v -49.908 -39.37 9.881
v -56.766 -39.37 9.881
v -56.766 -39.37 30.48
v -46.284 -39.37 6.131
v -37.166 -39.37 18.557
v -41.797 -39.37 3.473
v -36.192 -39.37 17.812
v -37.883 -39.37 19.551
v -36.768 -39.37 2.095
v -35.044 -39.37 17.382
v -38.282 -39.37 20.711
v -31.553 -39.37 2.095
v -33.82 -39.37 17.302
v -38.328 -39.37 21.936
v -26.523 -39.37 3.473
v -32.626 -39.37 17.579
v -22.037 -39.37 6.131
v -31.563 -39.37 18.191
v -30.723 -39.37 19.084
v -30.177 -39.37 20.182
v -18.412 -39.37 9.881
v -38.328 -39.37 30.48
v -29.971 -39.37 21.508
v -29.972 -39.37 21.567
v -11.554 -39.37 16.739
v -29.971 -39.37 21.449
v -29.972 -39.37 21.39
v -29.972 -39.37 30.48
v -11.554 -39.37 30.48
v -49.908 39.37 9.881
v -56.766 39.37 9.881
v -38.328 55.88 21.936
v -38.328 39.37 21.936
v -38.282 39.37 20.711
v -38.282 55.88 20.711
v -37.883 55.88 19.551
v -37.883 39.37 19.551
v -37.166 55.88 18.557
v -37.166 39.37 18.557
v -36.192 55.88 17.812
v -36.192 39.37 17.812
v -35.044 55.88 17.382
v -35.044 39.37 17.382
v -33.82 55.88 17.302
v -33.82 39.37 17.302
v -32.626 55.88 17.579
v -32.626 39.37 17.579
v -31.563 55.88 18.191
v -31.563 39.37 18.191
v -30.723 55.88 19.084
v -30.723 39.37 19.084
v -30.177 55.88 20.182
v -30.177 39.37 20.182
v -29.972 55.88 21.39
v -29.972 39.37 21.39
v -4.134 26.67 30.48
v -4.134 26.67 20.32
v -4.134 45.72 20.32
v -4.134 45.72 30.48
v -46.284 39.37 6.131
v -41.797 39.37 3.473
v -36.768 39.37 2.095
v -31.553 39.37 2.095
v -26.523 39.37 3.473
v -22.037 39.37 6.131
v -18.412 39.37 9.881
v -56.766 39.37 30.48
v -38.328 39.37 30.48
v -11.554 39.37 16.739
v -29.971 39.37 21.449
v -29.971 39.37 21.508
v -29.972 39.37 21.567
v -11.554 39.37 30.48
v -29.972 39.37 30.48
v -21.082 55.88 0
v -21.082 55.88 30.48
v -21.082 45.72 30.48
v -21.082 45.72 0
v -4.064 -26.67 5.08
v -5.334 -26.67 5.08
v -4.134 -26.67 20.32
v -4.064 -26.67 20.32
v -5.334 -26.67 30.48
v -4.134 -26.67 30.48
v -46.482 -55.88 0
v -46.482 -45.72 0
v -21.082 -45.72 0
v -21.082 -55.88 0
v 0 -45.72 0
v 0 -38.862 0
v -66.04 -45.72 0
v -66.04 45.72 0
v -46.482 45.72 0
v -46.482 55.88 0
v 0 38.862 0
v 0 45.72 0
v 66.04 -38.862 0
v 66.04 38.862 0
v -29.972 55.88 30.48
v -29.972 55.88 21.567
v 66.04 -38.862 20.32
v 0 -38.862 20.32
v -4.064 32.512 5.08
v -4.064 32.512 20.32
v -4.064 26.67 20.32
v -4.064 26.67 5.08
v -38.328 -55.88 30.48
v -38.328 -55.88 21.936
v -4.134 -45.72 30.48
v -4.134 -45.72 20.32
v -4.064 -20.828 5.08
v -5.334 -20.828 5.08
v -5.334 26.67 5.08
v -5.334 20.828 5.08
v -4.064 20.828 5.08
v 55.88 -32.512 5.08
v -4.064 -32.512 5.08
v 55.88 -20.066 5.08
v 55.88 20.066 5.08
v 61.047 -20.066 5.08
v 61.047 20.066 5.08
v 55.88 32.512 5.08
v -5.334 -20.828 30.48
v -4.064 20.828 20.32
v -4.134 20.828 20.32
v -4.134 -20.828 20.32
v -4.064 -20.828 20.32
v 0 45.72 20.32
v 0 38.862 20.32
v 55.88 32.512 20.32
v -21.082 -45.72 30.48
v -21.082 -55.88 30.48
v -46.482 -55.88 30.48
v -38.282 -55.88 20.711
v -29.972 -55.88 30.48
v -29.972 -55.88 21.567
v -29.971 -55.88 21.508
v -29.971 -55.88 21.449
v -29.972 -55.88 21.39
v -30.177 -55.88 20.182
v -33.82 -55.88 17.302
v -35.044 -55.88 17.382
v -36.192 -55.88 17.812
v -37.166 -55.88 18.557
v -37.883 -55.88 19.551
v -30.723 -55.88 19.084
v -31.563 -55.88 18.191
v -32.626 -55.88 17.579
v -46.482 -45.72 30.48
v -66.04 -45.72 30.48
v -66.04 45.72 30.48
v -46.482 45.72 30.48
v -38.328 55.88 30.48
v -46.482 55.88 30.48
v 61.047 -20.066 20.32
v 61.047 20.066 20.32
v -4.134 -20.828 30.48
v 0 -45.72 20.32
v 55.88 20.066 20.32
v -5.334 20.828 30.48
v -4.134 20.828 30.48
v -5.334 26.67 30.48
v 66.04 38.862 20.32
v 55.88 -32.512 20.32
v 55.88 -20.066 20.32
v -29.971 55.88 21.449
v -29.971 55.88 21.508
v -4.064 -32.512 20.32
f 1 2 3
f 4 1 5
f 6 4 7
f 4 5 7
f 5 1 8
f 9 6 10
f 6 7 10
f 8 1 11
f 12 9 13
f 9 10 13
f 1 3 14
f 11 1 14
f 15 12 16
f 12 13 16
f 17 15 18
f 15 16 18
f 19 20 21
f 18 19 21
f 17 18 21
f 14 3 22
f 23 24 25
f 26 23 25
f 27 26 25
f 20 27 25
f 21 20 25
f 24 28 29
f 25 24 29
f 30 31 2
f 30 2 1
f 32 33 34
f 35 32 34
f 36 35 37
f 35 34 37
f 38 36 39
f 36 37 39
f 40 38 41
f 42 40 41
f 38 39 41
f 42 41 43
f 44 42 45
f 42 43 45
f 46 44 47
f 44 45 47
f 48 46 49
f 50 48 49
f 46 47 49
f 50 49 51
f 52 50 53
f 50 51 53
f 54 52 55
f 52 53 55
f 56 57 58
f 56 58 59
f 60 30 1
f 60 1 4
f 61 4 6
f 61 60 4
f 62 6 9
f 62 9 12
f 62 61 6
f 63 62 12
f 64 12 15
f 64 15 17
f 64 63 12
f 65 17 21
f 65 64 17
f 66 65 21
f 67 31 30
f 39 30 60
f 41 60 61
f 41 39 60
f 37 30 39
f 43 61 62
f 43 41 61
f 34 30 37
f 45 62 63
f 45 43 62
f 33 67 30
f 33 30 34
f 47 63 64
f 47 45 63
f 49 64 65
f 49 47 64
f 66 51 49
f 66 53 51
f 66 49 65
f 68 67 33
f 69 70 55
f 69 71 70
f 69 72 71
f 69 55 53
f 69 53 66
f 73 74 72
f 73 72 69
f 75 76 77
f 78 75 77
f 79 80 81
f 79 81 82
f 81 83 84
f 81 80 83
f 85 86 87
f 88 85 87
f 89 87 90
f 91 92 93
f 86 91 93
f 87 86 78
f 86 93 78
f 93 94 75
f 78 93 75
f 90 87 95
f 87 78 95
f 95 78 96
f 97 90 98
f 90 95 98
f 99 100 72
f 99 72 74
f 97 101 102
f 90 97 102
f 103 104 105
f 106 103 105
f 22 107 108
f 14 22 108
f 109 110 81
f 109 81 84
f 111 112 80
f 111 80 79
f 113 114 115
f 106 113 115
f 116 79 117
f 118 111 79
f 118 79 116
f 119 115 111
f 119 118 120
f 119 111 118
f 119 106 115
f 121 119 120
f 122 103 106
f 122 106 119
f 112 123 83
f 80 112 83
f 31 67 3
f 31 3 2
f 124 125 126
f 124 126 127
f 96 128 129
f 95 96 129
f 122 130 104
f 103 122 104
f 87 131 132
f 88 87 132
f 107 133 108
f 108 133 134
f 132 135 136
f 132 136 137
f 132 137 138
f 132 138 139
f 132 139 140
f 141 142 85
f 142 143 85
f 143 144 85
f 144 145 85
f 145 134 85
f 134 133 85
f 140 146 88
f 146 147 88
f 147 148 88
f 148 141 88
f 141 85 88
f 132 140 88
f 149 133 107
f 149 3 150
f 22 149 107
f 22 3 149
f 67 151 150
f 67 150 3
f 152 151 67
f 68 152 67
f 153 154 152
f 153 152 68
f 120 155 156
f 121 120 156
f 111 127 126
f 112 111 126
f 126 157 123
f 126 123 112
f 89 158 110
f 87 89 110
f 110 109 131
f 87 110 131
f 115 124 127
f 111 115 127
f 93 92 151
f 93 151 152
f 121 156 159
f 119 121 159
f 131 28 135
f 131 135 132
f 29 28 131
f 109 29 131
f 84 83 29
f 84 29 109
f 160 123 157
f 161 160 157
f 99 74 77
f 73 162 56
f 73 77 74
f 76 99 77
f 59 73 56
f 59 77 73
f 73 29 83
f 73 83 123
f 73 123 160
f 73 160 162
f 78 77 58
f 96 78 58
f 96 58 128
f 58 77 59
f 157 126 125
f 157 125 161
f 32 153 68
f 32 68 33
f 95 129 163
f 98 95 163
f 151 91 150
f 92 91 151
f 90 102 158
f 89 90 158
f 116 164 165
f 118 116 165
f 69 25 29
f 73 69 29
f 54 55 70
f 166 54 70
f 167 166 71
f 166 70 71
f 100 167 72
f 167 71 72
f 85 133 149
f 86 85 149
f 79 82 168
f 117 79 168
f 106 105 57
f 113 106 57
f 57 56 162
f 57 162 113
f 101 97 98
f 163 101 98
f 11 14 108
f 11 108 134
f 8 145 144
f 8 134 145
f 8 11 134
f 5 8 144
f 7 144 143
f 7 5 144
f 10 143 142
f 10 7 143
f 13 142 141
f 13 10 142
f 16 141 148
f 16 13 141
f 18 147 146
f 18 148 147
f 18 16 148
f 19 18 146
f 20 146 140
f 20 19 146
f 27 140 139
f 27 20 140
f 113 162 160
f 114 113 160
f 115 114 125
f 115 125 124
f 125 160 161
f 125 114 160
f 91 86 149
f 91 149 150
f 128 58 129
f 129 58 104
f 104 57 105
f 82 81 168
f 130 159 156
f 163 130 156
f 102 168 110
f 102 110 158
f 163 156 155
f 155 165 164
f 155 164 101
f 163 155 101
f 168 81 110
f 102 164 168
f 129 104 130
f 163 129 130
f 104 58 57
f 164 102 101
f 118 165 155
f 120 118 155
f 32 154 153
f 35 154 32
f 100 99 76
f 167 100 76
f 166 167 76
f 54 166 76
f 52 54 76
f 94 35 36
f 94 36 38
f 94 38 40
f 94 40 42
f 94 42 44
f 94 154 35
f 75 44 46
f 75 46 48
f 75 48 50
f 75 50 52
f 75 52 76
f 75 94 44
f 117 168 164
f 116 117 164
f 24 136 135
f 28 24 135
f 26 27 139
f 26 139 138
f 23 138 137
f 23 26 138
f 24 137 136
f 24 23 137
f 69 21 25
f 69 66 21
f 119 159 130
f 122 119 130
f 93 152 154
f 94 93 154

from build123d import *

# Parameters (mm, degrees)
F0_W          = 132.08
F0_H          = 111.76
F1_DEPTH      = 30.48
F3_DEPTH      = 25.4
F5_DEPTH      = 39.37
F5_DEPTH_BACK = 39.37
F7_DEPTH      = 127
F7_DEPTH_BACK = 127
F8_W          = 70.1737586008
F8_H          = 10.16
F9_DEPTH      = 124.52238
F10_W         = 219.0220057964
F10_H         = 191.3975924253
F11_DEPTH     = 40.60273


with BuildPart() as f1:
    # F0 (on Top) → F1 (new body)
    with BuildSketch(Plane.XY):
        Rectangle(F0_W, F0_H)
    extrude(amount=F1_DEPTH)

    # F2 (on face) → F3 (cut)
    with BuildSketch(Plane.XY.offset(30.48)):
        Polygon((55.88, 32.512), (-4.064, 32.512), (-4.064, 26.67), (-5.334, 26.67), (-5.334, 20.828), (-4.064, 20.828), (-4.064, -20.828), (-5.334, -20.828), (-5.334, -26.67), (-4.064, -26.67), (-4.064, -32.512), (55.88, -32.512), (55.88, -20.066), (61.0470063984, -20.066), (61.0470063984, 20.066), (55.88, 20.066), align=None)
    extrude(amount=-F3_DEPTH, mode=Mode.SUBTRACT)

    # F4 (on Front) → F5 (cut, two sides)
    with BuildSketch(Plane.XZ) as f5_sk:
        with BuildLine():
            Line((-56.7663048146, 9.8806022625), (-49.9083048146, 9.8806022625))
            ThreePointArc((-49.9083048146, 9.8806022625), (-34.1603048146, 1.9206995202), (-18.4123048146, 9.8806022625))
            Line((-18.4123048146, 9.8806022625), (-11.5543048146, 16.7386022625))
            Line((-11.5543048146, 16.7386022625), (-11.5543048146, 37.6269482076))
            Line((-11.5543048146, 37.6269482076), (-56.7663048146, 37.6269482076))
            Line((-56.7663048146, 37.6269482076), (-56.7663048146, 9.8806022625))
        make_face()
    extrude(amount=F5_DEPTH, mode=Mode.SUBTRACT)
    extrude(f5_sk.sketch, amount=-F5_DEPTH_BACK, mode=Mode.SUBTRACT)

    # F6 (on Front) → F7 (cut, two sides)
    with BuildSketch(Plane.XZ) as f7_sk:
        with BuildLine():
            Line((-38.3278677172, 31.1981041294), (-38.3278677172, 21.9360575249))
            ThreePointArc((-38.3278677172, 21.9360575249), (-34.4349396554, 17.2967755581), (-29.9718115766, 21.3904675121))
            Line((-29.9718115766, 21.3904675121), (-29.9718115766, 21.5672736871))
            Line((-29.9718115766, 21.5672736871), (-29.9718115766, 31.1981041294))
            Line((-29.9718115766, 31.1981041294), (-38.3278677172, 31.1981041294))
        make_face()
        with BuildLine():
            Line((-29.9718115766, 21.5672736871), (-29.9718115766, 21.3904675121))
            ThreePointArc((-29.9718115766, 21.3904675121), (-29.9708791052, 21.4788705996), (-29.9718115766, 21.5672736871))
        make_face()
    extrude(amount=-F7_DEPTH, mode=Mode.SUBTRACT)
    extrude(f7_sk.sketch, amount=F7_DEPTH_BACK, mode=Mode.SUBTRACT)

    # F8 (on face) → F9 (cut)
    with BuildSketch(Plane.XZ.offset(55.88)):
        with Locations((30.9531206996, 25.4)):
            Rectangle(F8_W, F8_H)
    extrude(amount=-F9_DEPTH, mode=Mode.SUBTRACT)

    # F10 (on face) → F11 (cut)
    with BuildSketch(Plane.XY.offset(30.48)):
        with Locations((0.9173303843, -3.9965510368)):
            Rectangle(F10_W, F10_H)
        Polygon((-66.04, -45.72), (-66.04, 45.72), (-46.482, 45.72), (-46.482, 60.96), (-21.082, 60.96), (-21.082, 45.72), (0, 45.72), (0, 38.862), (67.551702261, 38.862), (67.551702261, -38.862), (0, -38.862), (0, -45.72), (-21.082, -45.72), (-21.082, -60.96), (-46.482, -60.96), (-46.482, -45.72), align=None, mode=Mode.SUBTRACT)
    extrude(amount=-F11_DEPTH, mode=Mode.SUBTRACT)


solid = f1.part
